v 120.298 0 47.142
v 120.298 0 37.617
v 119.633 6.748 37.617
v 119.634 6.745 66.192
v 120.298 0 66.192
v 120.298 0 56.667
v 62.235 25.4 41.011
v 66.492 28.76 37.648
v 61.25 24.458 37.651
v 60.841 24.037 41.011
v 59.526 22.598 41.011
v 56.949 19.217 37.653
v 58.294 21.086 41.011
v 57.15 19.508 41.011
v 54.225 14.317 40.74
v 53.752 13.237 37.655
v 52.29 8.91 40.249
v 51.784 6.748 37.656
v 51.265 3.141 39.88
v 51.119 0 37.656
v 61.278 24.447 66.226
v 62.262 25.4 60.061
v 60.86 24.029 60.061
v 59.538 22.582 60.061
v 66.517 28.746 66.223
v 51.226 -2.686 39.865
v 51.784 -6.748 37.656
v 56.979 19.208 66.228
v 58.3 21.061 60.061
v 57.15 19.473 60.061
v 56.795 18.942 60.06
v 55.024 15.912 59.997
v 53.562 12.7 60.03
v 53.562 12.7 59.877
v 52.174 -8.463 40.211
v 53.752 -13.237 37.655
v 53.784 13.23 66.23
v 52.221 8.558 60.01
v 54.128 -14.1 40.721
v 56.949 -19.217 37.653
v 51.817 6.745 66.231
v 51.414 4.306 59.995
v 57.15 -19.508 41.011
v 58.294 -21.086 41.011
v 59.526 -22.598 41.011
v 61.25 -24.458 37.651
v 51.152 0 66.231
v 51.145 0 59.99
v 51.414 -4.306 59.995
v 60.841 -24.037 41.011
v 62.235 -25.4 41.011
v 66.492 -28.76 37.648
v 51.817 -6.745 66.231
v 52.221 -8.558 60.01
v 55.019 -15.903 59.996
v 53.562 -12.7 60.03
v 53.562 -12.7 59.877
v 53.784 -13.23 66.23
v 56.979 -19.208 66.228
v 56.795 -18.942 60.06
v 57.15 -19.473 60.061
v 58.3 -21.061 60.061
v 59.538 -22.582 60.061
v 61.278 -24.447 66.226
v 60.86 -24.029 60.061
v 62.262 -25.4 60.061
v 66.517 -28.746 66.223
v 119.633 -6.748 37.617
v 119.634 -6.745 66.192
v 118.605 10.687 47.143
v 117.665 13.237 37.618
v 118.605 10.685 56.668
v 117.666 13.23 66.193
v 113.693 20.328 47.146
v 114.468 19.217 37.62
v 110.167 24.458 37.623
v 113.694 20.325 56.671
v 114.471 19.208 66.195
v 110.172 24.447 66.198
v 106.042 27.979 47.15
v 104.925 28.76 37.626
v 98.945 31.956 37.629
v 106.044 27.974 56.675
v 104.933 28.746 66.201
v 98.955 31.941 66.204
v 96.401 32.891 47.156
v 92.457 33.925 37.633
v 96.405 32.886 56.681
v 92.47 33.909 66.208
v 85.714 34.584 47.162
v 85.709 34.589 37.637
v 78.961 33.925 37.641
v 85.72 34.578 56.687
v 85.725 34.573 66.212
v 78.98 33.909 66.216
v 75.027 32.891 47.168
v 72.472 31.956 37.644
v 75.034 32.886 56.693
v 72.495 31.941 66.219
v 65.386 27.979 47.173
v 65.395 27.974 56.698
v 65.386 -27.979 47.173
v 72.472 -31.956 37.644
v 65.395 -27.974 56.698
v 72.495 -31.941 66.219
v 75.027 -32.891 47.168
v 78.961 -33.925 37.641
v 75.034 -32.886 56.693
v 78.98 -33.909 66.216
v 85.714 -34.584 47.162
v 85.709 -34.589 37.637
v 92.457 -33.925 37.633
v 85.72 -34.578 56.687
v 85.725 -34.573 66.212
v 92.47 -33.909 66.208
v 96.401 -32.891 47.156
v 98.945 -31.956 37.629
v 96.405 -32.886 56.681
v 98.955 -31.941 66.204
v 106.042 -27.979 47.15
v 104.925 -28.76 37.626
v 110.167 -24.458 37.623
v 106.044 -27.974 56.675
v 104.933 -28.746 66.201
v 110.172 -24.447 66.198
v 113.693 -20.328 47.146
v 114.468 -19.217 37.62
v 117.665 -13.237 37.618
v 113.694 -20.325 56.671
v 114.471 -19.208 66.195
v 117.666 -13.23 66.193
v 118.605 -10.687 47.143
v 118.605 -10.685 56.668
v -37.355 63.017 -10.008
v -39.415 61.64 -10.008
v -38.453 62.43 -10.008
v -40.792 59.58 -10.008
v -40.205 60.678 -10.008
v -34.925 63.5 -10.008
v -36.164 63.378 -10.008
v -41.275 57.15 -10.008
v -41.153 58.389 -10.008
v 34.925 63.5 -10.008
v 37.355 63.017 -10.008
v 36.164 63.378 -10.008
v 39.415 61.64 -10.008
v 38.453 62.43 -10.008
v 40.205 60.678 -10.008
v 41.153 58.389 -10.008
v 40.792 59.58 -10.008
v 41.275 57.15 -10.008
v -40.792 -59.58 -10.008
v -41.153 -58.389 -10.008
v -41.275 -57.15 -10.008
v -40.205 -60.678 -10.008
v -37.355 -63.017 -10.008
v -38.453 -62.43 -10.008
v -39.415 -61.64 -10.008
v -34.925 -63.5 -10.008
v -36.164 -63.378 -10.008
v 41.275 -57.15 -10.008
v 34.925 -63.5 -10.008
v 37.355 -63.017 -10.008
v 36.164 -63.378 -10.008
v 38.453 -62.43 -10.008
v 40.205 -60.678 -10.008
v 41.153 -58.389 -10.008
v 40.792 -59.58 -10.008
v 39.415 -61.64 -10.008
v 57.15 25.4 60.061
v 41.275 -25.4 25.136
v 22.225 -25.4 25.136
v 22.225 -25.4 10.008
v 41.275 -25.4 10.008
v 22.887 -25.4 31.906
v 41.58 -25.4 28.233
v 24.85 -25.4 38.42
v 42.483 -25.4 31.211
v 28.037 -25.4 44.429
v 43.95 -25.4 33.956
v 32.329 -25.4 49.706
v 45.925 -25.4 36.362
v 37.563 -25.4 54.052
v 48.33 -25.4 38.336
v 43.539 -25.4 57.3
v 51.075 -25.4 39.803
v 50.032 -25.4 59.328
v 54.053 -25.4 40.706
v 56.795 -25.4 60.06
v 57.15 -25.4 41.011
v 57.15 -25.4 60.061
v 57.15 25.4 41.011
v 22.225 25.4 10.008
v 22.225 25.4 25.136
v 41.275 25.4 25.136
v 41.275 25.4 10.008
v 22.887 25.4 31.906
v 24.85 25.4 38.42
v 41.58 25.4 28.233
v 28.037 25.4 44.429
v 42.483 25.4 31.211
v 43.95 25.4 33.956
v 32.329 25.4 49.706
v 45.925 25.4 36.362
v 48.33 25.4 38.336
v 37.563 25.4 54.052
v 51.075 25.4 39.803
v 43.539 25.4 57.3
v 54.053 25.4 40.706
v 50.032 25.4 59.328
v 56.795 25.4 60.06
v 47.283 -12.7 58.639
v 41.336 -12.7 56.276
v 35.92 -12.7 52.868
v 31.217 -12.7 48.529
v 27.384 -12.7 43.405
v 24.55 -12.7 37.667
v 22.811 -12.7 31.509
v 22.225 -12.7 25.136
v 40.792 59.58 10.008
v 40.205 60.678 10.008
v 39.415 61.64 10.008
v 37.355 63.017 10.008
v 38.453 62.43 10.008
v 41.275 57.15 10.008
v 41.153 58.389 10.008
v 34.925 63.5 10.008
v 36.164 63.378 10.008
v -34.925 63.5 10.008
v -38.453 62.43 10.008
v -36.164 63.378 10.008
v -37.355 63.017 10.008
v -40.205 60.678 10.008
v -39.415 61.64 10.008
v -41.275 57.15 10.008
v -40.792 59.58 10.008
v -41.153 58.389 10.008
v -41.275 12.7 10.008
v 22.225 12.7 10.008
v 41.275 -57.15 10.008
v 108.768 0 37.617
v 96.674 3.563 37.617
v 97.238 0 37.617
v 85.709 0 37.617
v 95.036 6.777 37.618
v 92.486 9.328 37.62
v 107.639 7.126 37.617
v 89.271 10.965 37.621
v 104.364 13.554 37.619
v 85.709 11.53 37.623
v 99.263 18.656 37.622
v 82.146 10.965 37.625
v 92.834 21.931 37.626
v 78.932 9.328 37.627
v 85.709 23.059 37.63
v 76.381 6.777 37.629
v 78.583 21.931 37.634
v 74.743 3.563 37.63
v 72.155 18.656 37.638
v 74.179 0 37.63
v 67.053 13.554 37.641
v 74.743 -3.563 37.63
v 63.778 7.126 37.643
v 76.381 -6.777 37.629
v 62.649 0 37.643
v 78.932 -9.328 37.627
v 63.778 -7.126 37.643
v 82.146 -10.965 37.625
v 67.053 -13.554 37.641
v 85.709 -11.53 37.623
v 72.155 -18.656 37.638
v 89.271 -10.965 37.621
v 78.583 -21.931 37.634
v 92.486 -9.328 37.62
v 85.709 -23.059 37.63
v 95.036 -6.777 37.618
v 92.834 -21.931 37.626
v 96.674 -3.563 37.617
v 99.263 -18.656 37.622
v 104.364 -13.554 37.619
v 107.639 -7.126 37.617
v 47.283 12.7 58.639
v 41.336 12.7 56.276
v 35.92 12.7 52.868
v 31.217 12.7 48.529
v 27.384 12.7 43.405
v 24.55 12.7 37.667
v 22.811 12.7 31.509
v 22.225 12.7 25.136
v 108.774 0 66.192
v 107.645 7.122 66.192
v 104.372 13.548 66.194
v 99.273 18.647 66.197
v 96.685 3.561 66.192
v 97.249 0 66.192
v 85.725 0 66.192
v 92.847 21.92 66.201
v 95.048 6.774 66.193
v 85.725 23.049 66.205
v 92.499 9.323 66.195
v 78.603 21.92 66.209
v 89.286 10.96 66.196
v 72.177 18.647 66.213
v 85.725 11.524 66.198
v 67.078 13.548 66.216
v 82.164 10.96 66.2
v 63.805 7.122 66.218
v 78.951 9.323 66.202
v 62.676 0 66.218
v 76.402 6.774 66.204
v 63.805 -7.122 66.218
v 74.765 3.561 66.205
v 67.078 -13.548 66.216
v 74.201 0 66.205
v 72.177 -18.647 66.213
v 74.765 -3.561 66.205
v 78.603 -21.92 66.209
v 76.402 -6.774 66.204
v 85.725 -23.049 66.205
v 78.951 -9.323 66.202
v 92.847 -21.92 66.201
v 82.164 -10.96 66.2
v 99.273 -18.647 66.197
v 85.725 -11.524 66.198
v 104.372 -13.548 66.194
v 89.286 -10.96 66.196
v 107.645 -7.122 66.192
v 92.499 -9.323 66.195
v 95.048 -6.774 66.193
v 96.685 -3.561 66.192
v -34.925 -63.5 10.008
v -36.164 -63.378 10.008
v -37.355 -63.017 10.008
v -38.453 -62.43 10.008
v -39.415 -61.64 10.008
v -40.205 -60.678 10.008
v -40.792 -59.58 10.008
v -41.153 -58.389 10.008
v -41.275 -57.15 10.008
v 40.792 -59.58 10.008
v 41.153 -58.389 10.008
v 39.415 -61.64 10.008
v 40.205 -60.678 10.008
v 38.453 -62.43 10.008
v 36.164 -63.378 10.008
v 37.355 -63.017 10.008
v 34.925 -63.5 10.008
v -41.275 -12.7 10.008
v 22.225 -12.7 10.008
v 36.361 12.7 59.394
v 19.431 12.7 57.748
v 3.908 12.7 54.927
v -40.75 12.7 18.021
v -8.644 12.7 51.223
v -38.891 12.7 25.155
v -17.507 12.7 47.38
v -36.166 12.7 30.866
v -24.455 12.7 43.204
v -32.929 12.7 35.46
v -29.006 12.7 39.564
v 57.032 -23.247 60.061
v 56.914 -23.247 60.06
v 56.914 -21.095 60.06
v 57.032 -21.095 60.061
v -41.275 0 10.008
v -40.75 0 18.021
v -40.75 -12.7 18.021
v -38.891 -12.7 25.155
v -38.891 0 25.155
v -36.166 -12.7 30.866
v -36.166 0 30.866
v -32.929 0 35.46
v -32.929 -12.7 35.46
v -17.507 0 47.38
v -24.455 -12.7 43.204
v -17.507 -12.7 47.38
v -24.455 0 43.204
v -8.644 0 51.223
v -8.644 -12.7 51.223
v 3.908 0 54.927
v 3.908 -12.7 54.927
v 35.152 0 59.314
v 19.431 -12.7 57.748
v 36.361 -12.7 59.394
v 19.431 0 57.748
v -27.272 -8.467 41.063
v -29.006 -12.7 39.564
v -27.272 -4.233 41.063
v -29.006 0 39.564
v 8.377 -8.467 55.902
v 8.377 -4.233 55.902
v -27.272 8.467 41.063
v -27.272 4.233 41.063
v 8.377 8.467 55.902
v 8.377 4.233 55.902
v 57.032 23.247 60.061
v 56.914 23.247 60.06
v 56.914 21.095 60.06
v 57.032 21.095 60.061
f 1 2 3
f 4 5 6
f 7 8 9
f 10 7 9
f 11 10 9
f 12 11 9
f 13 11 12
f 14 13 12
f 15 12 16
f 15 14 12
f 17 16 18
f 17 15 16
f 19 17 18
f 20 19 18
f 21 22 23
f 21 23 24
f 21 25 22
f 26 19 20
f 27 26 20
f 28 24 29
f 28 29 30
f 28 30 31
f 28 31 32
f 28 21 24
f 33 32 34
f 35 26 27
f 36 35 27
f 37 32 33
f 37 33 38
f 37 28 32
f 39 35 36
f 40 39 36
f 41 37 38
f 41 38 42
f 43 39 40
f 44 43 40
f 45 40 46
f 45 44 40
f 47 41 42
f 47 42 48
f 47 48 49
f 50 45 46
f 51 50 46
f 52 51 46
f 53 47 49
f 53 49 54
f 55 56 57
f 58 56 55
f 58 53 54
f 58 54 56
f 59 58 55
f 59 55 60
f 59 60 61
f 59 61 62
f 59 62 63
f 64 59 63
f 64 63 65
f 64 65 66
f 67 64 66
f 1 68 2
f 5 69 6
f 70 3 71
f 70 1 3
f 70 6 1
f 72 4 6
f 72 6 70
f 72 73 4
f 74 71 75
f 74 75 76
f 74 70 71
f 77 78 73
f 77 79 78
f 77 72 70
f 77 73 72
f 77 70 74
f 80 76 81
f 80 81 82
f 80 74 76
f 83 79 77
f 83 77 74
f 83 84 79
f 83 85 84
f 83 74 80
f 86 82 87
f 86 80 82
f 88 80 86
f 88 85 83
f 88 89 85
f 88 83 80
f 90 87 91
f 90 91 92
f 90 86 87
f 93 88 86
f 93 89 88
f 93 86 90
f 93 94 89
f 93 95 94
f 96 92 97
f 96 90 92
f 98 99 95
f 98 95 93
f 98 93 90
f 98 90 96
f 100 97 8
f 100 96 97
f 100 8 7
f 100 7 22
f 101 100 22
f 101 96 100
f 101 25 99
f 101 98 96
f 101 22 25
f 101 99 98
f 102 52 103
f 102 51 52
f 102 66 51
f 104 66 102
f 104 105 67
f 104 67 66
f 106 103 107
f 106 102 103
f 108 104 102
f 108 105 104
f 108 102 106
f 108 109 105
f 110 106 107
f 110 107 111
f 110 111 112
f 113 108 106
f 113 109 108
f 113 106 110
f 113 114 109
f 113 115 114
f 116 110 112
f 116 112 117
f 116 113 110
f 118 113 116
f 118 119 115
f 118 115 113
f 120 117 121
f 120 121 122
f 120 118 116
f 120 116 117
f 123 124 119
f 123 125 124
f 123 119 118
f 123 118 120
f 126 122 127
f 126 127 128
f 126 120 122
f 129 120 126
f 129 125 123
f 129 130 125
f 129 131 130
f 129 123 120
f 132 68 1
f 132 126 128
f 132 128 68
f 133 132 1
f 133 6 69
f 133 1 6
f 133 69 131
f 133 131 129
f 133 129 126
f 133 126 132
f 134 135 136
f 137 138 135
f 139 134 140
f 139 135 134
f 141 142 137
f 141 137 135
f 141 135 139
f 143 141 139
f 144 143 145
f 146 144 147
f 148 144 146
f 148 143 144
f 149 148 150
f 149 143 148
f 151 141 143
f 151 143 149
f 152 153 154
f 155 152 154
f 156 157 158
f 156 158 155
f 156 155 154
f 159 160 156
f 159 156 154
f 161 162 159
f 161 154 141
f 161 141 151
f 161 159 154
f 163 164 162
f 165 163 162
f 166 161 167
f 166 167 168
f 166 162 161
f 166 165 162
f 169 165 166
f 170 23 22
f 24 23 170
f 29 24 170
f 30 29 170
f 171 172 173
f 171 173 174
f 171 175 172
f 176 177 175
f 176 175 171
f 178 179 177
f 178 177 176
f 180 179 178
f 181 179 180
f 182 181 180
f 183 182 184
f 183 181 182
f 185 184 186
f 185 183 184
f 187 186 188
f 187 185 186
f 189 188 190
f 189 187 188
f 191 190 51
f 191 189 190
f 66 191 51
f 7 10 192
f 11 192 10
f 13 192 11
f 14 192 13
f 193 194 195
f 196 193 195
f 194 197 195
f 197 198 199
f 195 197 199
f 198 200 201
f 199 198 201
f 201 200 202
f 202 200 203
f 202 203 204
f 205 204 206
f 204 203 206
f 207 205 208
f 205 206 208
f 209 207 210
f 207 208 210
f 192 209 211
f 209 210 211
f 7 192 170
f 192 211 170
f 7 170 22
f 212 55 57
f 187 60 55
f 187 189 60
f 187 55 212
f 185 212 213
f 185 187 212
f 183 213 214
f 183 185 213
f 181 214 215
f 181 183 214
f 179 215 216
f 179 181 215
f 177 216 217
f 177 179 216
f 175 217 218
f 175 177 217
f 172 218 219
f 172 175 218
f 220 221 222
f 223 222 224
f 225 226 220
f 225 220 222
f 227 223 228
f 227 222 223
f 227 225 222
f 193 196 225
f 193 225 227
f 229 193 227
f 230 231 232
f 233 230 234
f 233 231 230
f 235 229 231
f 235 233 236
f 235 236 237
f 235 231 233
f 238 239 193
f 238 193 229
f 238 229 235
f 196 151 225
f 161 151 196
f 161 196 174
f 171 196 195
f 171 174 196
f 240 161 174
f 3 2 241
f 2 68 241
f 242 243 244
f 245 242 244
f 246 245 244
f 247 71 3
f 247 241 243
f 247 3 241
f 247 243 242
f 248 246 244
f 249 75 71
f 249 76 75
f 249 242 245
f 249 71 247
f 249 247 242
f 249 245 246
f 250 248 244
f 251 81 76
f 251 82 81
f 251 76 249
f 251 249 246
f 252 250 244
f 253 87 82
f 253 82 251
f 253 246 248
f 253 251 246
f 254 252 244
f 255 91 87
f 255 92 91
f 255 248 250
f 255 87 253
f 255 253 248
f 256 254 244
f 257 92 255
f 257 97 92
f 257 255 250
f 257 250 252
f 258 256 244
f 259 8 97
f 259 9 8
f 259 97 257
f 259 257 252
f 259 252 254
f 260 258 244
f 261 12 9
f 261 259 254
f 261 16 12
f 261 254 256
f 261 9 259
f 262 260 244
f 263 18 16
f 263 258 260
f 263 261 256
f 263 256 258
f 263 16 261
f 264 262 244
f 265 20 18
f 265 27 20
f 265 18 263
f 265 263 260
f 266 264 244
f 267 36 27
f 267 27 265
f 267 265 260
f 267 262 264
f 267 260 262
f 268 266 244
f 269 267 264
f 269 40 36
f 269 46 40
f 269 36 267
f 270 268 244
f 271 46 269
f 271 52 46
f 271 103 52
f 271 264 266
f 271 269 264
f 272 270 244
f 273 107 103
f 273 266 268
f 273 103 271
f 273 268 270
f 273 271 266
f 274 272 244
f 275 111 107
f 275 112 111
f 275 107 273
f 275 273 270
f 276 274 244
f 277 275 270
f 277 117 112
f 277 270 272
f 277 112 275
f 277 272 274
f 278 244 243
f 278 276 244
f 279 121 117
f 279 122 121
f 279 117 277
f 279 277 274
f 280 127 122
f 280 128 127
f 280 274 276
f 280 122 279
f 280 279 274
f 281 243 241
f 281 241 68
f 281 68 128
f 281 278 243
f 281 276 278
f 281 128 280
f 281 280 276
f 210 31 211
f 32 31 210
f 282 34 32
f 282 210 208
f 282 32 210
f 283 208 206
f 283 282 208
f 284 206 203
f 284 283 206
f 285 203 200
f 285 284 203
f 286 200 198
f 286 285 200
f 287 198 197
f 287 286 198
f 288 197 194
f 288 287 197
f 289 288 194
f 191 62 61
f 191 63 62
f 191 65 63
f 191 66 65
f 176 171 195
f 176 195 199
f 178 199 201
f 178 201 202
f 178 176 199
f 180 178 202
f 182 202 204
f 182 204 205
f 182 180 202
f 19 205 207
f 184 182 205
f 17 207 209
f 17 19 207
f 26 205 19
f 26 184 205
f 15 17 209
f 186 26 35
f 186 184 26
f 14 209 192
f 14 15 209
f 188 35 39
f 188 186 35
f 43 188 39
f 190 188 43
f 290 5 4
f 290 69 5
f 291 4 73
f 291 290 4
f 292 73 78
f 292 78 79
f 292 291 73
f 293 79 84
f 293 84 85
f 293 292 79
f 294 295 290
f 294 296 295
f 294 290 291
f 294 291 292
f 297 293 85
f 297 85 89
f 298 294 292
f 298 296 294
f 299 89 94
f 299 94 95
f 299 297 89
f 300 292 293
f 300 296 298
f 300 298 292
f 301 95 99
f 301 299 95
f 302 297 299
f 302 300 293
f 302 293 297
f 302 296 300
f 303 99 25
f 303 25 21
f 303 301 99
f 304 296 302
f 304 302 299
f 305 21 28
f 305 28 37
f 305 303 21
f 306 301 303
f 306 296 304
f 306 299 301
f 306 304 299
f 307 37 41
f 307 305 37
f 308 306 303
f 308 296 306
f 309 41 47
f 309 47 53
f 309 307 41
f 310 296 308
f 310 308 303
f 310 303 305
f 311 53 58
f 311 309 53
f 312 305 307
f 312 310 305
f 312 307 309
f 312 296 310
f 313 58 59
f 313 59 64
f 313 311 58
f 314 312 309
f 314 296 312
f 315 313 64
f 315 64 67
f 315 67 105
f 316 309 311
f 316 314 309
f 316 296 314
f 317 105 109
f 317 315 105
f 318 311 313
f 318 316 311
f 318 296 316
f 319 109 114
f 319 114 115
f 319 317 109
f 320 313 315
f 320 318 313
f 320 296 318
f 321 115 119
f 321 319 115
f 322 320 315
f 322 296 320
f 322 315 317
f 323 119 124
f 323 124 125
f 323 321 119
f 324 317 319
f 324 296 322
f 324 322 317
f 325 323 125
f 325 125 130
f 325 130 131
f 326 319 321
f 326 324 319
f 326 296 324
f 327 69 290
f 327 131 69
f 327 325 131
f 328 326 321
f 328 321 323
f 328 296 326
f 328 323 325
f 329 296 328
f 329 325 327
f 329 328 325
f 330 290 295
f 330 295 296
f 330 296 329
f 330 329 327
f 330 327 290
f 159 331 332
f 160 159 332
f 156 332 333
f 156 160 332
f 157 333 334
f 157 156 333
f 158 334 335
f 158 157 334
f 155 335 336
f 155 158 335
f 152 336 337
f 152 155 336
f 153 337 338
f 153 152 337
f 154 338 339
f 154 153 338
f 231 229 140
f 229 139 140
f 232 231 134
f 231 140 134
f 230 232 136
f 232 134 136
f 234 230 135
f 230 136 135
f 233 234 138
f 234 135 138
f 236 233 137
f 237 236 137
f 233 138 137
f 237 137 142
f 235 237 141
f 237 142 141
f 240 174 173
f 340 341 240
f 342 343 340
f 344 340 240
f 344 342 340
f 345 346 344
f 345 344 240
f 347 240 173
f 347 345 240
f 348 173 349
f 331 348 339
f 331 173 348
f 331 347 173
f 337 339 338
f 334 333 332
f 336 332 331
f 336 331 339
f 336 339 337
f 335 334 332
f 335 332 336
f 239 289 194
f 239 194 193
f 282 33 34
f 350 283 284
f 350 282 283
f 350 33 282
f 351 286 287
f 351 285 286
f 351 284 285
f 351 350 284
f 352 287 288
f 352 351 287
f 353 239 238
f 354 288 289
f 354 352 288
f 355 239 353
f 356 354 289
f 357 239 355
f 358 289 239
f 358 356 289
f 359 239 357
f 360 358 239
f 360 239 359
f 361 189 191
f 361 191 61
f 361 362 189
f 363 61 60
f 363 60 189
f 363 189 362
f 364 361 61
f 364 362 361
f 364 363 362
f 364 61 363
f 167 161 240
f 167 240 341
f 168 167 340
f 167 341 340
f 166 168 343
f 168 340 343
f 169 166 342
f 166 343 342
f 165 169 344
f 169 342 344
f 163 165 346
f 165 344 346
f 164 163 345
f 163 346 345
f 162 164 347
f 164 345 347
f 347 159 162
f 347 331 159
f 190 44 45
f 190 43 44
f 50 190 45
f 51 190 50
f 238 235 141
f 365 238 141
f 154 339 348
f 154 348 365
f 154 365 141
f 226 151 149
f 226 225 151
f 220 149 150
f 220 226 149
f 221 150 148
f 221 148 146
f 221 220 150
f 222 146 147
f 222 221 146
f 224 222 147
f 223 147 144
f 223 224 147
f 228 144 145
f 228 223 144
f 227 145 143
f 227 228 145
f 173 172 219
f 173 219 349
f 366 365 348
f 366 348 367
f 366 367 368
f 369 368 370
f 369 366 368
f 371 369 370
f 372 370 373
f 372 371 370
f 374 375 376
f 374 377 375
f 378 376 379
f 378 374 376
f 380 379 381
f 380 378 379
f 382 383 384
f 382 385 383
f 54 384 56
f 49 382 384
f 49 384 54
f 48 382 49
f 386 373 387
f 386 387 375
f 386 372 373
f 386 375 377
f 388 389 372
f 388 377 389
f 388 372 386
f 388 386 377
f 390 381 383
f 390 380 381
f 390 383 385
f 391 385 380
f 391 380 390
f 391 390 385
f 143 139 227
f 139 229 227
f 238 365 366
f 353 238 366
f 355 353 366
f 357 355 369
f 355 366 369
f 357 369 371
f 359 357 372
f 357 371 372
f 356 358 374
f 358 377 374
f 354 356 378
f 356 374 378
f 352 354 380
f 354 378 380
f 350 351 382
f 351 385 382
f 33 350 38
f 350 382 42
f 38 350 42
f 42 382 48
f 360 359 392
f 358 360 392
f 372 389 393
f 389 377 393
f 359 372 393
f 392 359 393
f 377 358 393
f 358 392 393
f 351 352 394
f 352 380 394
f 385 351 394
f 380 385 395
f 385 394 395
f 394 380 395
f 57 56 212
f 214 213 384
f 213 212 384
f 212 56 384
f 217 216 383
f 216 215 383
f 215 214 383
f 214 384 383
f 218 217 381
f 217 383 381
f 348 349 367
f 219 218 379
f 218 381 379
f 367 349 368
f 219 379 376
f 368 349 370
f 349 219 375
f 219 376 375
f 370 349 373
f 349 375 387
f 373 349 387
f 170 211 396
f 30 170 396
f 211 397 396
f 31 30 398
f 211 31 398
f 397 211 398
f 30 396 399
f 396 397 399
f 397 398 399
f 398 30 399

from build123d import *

# Parameters (mm, degrees)
F1_DEPTH = 63.5
F2_DEPTH = 25.4
F4_R     = 6.35
F5_DEPTH = 12.7


with BuildPart() as f1:
    # F0 (on Front) → F1 (new body, symmetric)
    with BuildSketch(Plane.XZ):
        Polygon((-41.275, -10.008192715), (41.275, -10.008192715), (41.275, 10.008192715), (22.225, 10.008192715), (-41.275, 10.008192715), align=None)
    extrude(amount=F1_DEPTH, both=True)

    # F0 (on Front) → F2 (join, symmetric)
    with BuildSketch(Plane.XZ):
        with BuildLine():
            Line((22.225, 10.008192715), (41.275, 10.008192715))
            Line((41.275, 10.008192715), (41.275, 25.136330729))
            ThreePointArc((41.275, 25.136330729), (45.9246798487, 36.3616508803), (57.15, 41.011330729))
            Line((57.15, 41.011330729), (69.4978268266, 41.011330729))
            Line((69.4978268266, 41.011330729), (69.4978268266, 60.061330729))
            Line((69.4978268266, 60.061330729), (57.15, 60.061330729))
            add(Edge.make_bspline(
                [(56.7953338747, 60.0595298514), (56.913590658, 60.0601784283), (57.0318130144, 60.0607785778), (57.15, 60.061330729)],
                knots=[110.1425661044, 110.1425661044, 110.1425661044, 110.1425661044, 110.421000041, 110.421000041, 110.421000041, 110.421000041], degree=3))
            ThreePointArc((56.7953338747, 60.0595298514), (32.3292189947, 49.7063216791), (22.225, 25.136330729))
            Line((22.225, 25.136330729), (22.225, 10.008192715))
        make_face()
        Polygon((69.4978268266, 60.061330729), (69.4978268266, 41.011330729), (85.7105576537, 41.011330729), (85.7214838447, 60.061330729), align=None)
    extrude(amount=F2_DEPTH, both=True)

    # F0 (on Front) → F3 (revolve)
    with BuildSketch(Plane.XZ):
        Polygon((85.7214838447, 60.061330729), (85.7105576537, 41.011330729), (85.7086107135, 37.616807285), (120.2978268266, 37.616807285), (120.2978268266, 66.191807285), (85.725, 66.191807285), align=None)
    revolve(axis=Axis((85.7168053567, 0, 51.904307285), (0.0005735532, 0, 0.9999998355)))

    # F4
    f4_edges = [f1.edges().sort_by_distance(p)[0] for p in [
        (-41.275, -63.5, 0),
        (41.275, -63.5, 0),
        (41.275, 63.5, 0),
        (-41.275, 63.5, 0),
    ]]
    fillet(f4_edges, radius=F4_R)

    # F0 (on Front) → F5 (join, symmetric)
    with BuildSketch(Plane.XZ):
        with BuildLine():
            add(Edge.make_bspline(
                [(-41.275, 10.008192715), (-42.1516341182, 51.9683743999), (10.0154559074, 59.8029665762), (56.7953338747, 60.0595298514)],
                knots=[0, 0, 0, 0, 110.1425661044, 110.1425661044, 110.1425661044, 110.1425661044], degree=3))
            Line((-41.275, 10.008192715), (22.225, 10.008192715))
            Line((22.225, 10.008192715), (22.225, 25.136330729))
            ThreePointArc((22.225, 25.136330729), (32.3292189947, 49.7063216791), (56.7953338747, 60.0595298514))
        make_face()
    extrude(amount=F5_DEPTH, both=True)


solid = f1.part
